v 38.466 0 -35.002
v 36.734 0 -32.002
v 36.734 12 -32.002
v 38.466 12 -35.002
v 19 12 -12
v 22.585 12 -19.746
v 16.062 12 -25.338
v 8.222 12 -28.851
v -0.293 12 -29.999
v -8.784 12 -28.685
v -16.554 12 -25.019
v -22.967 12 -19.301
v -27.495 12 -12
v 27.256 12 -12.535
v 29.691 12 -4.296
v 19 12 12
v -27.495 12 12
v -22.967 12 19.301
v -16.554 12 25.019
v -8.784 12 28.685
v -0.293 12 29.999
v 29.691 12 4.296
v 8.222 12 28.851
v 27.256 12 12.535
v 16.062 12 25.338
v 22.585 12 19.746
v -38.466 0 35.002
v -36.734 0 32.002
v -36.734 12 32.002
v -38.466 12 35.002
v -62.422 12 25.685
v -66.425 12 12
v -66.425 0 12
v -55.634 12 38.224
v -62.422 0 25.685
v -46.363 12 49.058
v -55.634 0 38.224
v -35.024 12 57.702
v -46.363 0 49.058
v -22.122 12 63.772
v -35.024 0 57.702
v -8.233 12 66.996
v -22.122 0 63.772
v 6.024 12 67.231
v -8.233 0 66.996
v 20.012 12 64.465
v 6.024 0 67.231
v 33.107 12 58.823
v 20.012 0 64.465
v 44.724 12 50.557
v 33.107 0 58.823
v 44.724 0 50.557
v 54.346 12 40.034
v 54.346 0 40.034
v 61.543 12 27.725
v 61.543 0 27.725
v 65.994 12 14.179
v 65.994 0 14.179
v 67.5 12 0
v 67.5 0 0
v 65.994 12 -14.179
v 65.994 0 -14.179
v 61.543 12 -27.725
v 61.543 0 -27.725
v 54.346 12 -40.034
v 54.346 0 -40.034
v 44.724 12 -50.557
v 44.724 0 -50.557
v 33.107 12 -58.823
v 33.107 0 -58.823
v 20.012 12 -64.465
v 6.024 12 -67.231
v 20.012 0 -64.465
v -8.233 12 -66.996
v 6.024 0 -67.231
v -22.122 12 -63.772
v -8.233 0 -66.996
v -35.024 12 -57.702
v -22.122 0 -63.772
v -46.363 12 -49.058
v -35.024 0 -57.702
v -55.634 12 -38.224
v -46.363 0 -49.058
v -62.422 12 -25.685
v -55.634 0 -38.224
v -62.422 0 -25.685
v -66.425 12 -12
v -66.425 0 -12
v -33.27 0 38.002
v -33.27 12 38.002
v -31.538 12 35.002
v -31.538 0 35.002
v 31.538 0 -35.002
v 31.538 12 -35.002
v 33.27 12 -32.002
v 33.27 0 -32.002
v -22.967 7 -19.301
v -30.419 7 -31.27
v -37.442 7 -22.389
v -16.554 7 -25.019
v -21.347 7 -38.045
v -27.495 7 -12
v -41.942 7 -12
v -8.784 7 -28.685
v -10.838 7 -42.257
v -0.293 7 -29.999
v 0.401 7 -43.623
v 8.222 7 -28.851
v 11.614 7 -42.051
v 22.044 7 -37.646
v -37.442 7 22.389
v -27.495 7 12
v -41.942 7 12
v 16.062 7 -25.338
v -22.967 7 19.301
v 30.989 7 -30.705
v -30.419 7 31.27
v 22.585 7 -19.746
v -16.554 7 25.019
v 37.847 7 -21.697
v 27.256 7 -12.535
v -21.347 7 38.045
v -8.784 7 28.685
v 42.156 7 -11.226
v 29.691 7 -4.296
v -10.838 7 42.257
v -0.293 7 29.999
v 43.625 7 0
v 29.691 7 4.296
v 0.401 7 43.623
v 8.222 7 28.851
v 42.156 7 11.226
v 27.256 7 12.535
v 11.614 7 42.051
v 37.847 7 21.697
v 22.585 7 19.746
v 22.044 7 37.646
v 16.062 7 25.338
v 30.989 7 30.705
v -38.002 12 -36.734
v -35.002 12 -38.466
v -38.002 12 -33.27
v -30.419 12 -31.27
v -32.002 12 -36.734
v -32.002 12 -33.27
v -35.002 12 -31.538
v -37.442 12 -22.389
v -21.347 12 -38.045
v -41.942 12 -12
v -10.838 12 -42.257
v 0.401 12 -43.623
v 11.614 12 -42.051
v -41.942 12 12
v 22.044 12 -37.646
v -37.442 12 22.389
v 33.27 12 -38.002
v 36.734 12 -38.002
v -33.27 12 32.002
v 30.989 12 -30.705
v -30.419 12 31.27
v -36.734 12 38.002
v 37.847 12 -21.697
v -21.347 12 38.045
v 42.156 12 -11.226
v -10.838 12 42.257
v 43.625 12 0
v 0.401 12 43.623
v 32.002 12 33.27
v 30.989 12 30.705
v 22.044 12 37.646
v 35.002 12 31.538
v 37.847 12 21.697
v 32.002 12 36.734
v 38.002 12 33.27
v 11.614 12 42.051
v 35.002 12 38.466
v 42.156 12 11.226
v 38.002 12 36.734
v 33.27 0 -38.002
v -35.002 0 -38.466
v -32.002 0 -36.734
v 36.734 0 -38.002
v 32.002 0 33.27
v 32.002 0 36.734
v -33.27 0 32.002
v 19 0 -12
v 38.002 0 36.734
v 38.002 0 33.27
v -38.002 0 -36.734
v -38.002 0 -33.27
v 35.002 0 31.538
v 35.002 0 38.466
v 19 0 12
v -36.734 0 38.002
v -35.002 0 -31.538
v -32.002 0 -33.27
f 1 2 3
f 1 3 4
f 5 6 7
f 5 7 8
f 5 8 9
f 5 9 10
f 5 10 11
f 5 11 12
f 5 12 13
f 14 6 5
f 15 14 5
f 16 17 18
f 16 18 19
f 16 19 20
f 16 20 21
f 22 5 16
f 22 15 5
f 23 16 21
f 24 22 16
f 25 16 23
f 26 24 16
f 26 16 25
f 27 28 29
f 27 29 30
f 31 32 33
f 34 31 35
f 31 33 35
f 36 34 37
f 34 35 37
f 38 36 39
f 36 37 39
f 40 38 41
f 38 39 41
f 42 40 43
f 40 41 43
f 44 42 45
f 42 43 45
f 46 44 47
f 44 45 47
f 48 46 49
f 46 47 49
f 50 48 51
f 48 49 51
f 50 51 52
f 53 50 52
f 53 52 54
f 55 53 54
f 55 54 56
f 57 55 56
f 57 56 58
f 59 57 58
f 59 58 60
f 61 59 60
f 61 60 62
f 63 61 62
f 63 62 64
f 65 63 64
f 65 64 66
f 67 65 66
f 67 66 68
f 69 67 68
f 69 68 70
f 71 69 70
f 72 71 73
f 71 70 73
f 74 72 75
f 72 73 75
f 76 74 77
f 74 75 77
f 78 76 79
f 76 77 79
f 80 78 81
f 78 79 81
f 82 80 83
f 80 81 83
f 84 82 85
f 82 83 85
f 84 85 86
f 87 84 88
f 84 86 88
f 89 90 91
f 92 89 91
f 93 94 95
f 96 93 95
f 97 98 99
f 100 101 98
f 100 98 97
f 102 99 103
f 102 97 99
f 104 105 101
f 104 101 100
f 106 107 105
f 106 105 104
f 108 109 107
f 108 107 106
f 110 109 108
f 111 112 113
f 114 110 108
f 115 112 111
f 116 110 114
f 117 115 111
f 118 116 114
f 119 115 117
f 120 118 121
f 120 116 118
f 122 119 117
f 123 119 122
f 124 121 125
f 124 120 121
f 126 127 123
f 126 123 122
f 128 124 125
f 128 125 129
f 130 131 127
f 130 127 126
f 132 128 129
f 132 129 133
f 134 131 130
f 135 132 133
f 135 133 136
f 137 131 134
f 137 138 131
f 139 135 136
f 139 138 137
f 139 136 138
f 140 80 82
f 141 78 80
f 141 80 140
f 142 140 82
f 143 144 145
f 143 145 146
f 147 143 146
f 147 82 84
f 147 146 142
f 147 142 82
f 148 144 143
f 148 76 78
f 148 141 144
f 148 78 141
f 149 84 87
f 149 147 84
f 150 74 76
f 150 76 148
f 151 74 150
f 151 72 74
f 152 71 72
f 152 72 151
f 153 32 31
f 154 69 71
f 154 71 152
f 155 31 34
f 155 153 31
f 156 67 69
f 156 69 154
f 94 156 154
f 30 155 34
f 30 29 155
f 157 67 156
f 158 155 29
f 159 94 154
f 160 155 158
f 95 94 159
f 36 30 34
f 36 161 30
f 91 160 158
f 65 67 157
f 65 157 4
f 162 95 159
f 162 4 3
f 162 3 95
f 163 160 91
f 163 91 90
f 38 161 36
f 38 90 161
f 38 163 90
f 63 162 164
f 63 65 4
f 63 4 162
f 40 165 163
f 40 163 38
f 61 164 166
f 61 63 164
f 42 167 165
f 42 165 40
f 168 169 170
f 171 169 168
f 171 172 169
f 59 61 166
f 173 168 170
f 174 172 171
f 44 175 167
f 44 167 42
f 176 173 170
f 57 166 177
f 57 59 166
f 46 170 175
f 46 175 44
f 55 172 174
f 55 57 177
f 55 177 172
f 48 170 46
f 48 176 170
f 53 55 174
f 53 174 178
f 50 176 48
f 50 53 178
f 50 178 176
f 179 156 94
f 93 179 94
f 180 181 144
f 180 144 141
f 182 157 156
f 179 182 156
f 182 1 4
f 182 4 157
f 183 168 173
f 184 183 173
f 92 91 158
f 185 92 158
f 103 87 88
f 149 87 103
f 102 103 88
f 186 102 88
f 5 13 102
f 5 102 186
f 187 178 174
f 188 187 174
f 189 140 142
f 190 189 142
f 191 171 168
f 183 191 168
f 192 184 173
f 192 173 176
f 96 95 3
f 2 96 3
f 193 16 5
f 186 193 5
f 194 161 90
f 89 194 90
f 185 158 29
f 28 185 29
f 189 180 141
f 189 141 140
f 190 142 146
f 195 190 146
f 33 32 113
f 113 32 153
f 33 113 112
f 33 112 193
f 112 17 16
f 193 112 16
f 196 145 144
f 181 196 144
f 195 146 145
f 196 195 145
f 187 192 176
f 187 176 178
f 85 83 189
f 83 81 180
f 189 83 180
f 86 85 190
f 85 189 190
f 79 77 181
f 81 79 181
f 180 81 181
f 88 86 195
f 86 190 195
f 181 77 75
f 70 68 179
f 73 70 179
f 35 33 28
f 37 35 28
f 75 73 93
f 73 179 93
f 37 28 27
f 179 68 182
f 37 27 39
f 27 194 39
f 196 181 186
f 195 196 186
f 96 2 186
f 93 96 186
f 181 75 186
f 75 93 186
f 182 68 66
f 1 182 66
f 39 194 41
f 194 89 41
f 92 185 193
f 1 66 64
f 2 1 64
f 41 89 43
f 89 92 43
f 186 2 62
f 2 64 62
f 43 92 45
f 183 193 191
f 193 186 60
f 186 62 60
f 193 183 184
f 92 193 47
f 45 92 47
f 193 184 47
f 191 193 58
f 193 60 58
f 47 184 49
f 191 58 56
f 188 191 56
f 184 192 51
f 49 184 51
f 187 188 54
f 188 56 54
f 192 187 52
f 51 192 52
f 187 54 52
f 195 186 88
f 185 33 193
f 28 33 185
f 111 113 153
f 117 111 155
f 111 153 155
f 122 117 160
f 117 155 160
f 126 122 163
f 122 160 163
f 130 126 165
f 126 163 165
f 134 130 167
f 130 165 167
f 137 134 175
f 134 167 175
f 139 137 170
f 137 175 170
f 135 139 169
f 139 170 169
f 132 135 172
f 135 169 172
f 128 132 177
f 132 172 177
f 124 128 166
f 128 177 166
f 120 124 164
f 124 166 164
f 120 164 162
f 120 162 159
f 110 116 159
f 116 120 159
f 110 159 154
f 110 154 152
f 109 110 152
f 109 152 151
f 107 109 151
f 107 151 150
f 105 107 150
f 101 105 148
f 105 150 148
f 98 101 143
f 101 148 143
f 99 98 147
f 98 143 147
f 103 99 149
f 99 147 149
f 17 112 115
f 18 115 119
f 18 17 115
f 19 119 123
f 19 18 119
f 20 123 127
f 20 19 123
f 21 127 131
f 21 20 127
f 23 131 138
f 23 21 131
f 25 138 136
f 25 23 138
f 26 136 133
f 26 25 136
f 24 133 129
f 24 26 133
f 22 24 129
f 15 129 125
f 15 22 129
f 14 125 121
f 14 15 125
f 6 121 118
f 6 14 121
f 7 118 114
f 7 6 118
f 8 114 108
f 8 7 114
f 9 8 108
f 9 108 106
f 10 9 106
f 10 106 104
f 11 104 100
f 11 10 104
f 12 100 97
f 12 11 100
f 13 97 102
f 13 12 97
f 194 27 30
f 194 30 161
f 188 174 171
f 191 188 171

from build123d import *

# Parameters (mm, degrees)
SKETCH_1_R          = 67.5
EXTRUDE_1_DEPTH     = 12
SKETCH_2_W          = 60
SKETCH_2_H          = 24
CUT_EXTRUDE_1_DEPTH = 97.210706265
CUT_EXTRUDE_3_DEPTH = 97.210706265
SKETCH_5_R          = 43.625
SKETCH_5_R_2        = 30
CUT_EXTRUDE_4_DEPTH = 5
SKETCH_6_W          = 75.06754016
SKETCH_6_H          = 24
CUT_EXTRUDE_5_DEPTH = 97.210706265


with BuildPart() as part:
    # 草图1 → 凸台-拉伸1 (new body)
    with BuildSketch(Plane(origin=(0, 0, 0), x_dir=(1, 0, 0), z_dir=(0, 1, 0))):
        with Locations(Location((0, 0, 0), (0, 0, 270))):
            Circle(SKETCH_1_R)
    extrude(amount=EXTRUDE_1_DEPTH)

    # 草图2 → 切除-拉伸1 (cut, through all)
    with BuildSketch(Plane(origin=(0, 12, 0), x_dir=(1, 0, 0), z_dir=(0, 1, 0))):
        with Locations((-11, 0)):
            Rectangle(SKETCH_2_W, SKETCH_2_H)
    extrude(amount=-CUT_EXTRUDE_1_DEPTH, mode=Mode.SUBTRACT)

    # 草图4 → 切除-拉伸3 (cut, through all)
    with BuildSketch(Plane(origin=(0, 12, 0), x_dir=(1, 0, 0), z_dir=(0, 1, 0))):
        Polygon((35.001785669, -38.465887284), (38.001785669, -36.733836476), (38.001785669, -33.269734861), (35.001785669, -31.537684054), (32.001785669, -33.269734861), (32.001785669, -36.733836476), align=None)
        Polygon((38.465887284, 35.001785669), (36.733836476, 38.001785669), (33.269734861, 38.001785669), (31.537684054, 35.001785669), (33.269734861, 32.001785669), (36.733836476, 32.001785669), align=None)
        Polygon((-38.465887284, -35.001785669), (-36.733836476, -38.001785669), (-33.269734861, -38.001785669), (-31.537684054, -35.001785669), (-33.269734861, -32.001785669), (-36.733836476, -32.001785669), align=None)
        Polygon((-35.001785669, 38.465887284), (-38.001785669, 36.733836476), (-38.001785669, 33.269734861), (-35.001785669, 31.537684054), (-32.001785669, 33.269734861), (-32.001785669, 36.733836476), align=None)
    extrude(amount=-CUT_EXTRUDE_3_DEPTH, mode=Mode.SUBTRACT)

    # 草图5 → 切除-拉伸4 (cut)
    with BuildSketch(Plane(origin=(0, 12, 0), x_dir=(1, 0, 0), z_dir=(0, 1, 0))):
        with Locations(Location((0, 0, 0), (0, 0, 270))):
            Circle(SKETCH_5_R)
        Circle(SKETCH_5_R_2, mode=Mode.SUBTRACT)
    extrude(amount=-CUT_EXTRUDE_4_DEPTH, mode=Mode.SUBTRACT)

    # 草图6 → 切除-拉伸5 (cut, through all)
    with BuildSketch(Plane(origin=(0, 12, 0), x_dir=(1, 0, 0), z_dir=(0, 1, 0))):
        with Locations((-78.53377008, 0)):
            Rectangle(SKETCH_6_W, SKETCH_6_H)
    extrude(amount=-CUT_EXTRUDE_5_DEPTH, mode=Mode.SUBTRACT)


solid = part.part
